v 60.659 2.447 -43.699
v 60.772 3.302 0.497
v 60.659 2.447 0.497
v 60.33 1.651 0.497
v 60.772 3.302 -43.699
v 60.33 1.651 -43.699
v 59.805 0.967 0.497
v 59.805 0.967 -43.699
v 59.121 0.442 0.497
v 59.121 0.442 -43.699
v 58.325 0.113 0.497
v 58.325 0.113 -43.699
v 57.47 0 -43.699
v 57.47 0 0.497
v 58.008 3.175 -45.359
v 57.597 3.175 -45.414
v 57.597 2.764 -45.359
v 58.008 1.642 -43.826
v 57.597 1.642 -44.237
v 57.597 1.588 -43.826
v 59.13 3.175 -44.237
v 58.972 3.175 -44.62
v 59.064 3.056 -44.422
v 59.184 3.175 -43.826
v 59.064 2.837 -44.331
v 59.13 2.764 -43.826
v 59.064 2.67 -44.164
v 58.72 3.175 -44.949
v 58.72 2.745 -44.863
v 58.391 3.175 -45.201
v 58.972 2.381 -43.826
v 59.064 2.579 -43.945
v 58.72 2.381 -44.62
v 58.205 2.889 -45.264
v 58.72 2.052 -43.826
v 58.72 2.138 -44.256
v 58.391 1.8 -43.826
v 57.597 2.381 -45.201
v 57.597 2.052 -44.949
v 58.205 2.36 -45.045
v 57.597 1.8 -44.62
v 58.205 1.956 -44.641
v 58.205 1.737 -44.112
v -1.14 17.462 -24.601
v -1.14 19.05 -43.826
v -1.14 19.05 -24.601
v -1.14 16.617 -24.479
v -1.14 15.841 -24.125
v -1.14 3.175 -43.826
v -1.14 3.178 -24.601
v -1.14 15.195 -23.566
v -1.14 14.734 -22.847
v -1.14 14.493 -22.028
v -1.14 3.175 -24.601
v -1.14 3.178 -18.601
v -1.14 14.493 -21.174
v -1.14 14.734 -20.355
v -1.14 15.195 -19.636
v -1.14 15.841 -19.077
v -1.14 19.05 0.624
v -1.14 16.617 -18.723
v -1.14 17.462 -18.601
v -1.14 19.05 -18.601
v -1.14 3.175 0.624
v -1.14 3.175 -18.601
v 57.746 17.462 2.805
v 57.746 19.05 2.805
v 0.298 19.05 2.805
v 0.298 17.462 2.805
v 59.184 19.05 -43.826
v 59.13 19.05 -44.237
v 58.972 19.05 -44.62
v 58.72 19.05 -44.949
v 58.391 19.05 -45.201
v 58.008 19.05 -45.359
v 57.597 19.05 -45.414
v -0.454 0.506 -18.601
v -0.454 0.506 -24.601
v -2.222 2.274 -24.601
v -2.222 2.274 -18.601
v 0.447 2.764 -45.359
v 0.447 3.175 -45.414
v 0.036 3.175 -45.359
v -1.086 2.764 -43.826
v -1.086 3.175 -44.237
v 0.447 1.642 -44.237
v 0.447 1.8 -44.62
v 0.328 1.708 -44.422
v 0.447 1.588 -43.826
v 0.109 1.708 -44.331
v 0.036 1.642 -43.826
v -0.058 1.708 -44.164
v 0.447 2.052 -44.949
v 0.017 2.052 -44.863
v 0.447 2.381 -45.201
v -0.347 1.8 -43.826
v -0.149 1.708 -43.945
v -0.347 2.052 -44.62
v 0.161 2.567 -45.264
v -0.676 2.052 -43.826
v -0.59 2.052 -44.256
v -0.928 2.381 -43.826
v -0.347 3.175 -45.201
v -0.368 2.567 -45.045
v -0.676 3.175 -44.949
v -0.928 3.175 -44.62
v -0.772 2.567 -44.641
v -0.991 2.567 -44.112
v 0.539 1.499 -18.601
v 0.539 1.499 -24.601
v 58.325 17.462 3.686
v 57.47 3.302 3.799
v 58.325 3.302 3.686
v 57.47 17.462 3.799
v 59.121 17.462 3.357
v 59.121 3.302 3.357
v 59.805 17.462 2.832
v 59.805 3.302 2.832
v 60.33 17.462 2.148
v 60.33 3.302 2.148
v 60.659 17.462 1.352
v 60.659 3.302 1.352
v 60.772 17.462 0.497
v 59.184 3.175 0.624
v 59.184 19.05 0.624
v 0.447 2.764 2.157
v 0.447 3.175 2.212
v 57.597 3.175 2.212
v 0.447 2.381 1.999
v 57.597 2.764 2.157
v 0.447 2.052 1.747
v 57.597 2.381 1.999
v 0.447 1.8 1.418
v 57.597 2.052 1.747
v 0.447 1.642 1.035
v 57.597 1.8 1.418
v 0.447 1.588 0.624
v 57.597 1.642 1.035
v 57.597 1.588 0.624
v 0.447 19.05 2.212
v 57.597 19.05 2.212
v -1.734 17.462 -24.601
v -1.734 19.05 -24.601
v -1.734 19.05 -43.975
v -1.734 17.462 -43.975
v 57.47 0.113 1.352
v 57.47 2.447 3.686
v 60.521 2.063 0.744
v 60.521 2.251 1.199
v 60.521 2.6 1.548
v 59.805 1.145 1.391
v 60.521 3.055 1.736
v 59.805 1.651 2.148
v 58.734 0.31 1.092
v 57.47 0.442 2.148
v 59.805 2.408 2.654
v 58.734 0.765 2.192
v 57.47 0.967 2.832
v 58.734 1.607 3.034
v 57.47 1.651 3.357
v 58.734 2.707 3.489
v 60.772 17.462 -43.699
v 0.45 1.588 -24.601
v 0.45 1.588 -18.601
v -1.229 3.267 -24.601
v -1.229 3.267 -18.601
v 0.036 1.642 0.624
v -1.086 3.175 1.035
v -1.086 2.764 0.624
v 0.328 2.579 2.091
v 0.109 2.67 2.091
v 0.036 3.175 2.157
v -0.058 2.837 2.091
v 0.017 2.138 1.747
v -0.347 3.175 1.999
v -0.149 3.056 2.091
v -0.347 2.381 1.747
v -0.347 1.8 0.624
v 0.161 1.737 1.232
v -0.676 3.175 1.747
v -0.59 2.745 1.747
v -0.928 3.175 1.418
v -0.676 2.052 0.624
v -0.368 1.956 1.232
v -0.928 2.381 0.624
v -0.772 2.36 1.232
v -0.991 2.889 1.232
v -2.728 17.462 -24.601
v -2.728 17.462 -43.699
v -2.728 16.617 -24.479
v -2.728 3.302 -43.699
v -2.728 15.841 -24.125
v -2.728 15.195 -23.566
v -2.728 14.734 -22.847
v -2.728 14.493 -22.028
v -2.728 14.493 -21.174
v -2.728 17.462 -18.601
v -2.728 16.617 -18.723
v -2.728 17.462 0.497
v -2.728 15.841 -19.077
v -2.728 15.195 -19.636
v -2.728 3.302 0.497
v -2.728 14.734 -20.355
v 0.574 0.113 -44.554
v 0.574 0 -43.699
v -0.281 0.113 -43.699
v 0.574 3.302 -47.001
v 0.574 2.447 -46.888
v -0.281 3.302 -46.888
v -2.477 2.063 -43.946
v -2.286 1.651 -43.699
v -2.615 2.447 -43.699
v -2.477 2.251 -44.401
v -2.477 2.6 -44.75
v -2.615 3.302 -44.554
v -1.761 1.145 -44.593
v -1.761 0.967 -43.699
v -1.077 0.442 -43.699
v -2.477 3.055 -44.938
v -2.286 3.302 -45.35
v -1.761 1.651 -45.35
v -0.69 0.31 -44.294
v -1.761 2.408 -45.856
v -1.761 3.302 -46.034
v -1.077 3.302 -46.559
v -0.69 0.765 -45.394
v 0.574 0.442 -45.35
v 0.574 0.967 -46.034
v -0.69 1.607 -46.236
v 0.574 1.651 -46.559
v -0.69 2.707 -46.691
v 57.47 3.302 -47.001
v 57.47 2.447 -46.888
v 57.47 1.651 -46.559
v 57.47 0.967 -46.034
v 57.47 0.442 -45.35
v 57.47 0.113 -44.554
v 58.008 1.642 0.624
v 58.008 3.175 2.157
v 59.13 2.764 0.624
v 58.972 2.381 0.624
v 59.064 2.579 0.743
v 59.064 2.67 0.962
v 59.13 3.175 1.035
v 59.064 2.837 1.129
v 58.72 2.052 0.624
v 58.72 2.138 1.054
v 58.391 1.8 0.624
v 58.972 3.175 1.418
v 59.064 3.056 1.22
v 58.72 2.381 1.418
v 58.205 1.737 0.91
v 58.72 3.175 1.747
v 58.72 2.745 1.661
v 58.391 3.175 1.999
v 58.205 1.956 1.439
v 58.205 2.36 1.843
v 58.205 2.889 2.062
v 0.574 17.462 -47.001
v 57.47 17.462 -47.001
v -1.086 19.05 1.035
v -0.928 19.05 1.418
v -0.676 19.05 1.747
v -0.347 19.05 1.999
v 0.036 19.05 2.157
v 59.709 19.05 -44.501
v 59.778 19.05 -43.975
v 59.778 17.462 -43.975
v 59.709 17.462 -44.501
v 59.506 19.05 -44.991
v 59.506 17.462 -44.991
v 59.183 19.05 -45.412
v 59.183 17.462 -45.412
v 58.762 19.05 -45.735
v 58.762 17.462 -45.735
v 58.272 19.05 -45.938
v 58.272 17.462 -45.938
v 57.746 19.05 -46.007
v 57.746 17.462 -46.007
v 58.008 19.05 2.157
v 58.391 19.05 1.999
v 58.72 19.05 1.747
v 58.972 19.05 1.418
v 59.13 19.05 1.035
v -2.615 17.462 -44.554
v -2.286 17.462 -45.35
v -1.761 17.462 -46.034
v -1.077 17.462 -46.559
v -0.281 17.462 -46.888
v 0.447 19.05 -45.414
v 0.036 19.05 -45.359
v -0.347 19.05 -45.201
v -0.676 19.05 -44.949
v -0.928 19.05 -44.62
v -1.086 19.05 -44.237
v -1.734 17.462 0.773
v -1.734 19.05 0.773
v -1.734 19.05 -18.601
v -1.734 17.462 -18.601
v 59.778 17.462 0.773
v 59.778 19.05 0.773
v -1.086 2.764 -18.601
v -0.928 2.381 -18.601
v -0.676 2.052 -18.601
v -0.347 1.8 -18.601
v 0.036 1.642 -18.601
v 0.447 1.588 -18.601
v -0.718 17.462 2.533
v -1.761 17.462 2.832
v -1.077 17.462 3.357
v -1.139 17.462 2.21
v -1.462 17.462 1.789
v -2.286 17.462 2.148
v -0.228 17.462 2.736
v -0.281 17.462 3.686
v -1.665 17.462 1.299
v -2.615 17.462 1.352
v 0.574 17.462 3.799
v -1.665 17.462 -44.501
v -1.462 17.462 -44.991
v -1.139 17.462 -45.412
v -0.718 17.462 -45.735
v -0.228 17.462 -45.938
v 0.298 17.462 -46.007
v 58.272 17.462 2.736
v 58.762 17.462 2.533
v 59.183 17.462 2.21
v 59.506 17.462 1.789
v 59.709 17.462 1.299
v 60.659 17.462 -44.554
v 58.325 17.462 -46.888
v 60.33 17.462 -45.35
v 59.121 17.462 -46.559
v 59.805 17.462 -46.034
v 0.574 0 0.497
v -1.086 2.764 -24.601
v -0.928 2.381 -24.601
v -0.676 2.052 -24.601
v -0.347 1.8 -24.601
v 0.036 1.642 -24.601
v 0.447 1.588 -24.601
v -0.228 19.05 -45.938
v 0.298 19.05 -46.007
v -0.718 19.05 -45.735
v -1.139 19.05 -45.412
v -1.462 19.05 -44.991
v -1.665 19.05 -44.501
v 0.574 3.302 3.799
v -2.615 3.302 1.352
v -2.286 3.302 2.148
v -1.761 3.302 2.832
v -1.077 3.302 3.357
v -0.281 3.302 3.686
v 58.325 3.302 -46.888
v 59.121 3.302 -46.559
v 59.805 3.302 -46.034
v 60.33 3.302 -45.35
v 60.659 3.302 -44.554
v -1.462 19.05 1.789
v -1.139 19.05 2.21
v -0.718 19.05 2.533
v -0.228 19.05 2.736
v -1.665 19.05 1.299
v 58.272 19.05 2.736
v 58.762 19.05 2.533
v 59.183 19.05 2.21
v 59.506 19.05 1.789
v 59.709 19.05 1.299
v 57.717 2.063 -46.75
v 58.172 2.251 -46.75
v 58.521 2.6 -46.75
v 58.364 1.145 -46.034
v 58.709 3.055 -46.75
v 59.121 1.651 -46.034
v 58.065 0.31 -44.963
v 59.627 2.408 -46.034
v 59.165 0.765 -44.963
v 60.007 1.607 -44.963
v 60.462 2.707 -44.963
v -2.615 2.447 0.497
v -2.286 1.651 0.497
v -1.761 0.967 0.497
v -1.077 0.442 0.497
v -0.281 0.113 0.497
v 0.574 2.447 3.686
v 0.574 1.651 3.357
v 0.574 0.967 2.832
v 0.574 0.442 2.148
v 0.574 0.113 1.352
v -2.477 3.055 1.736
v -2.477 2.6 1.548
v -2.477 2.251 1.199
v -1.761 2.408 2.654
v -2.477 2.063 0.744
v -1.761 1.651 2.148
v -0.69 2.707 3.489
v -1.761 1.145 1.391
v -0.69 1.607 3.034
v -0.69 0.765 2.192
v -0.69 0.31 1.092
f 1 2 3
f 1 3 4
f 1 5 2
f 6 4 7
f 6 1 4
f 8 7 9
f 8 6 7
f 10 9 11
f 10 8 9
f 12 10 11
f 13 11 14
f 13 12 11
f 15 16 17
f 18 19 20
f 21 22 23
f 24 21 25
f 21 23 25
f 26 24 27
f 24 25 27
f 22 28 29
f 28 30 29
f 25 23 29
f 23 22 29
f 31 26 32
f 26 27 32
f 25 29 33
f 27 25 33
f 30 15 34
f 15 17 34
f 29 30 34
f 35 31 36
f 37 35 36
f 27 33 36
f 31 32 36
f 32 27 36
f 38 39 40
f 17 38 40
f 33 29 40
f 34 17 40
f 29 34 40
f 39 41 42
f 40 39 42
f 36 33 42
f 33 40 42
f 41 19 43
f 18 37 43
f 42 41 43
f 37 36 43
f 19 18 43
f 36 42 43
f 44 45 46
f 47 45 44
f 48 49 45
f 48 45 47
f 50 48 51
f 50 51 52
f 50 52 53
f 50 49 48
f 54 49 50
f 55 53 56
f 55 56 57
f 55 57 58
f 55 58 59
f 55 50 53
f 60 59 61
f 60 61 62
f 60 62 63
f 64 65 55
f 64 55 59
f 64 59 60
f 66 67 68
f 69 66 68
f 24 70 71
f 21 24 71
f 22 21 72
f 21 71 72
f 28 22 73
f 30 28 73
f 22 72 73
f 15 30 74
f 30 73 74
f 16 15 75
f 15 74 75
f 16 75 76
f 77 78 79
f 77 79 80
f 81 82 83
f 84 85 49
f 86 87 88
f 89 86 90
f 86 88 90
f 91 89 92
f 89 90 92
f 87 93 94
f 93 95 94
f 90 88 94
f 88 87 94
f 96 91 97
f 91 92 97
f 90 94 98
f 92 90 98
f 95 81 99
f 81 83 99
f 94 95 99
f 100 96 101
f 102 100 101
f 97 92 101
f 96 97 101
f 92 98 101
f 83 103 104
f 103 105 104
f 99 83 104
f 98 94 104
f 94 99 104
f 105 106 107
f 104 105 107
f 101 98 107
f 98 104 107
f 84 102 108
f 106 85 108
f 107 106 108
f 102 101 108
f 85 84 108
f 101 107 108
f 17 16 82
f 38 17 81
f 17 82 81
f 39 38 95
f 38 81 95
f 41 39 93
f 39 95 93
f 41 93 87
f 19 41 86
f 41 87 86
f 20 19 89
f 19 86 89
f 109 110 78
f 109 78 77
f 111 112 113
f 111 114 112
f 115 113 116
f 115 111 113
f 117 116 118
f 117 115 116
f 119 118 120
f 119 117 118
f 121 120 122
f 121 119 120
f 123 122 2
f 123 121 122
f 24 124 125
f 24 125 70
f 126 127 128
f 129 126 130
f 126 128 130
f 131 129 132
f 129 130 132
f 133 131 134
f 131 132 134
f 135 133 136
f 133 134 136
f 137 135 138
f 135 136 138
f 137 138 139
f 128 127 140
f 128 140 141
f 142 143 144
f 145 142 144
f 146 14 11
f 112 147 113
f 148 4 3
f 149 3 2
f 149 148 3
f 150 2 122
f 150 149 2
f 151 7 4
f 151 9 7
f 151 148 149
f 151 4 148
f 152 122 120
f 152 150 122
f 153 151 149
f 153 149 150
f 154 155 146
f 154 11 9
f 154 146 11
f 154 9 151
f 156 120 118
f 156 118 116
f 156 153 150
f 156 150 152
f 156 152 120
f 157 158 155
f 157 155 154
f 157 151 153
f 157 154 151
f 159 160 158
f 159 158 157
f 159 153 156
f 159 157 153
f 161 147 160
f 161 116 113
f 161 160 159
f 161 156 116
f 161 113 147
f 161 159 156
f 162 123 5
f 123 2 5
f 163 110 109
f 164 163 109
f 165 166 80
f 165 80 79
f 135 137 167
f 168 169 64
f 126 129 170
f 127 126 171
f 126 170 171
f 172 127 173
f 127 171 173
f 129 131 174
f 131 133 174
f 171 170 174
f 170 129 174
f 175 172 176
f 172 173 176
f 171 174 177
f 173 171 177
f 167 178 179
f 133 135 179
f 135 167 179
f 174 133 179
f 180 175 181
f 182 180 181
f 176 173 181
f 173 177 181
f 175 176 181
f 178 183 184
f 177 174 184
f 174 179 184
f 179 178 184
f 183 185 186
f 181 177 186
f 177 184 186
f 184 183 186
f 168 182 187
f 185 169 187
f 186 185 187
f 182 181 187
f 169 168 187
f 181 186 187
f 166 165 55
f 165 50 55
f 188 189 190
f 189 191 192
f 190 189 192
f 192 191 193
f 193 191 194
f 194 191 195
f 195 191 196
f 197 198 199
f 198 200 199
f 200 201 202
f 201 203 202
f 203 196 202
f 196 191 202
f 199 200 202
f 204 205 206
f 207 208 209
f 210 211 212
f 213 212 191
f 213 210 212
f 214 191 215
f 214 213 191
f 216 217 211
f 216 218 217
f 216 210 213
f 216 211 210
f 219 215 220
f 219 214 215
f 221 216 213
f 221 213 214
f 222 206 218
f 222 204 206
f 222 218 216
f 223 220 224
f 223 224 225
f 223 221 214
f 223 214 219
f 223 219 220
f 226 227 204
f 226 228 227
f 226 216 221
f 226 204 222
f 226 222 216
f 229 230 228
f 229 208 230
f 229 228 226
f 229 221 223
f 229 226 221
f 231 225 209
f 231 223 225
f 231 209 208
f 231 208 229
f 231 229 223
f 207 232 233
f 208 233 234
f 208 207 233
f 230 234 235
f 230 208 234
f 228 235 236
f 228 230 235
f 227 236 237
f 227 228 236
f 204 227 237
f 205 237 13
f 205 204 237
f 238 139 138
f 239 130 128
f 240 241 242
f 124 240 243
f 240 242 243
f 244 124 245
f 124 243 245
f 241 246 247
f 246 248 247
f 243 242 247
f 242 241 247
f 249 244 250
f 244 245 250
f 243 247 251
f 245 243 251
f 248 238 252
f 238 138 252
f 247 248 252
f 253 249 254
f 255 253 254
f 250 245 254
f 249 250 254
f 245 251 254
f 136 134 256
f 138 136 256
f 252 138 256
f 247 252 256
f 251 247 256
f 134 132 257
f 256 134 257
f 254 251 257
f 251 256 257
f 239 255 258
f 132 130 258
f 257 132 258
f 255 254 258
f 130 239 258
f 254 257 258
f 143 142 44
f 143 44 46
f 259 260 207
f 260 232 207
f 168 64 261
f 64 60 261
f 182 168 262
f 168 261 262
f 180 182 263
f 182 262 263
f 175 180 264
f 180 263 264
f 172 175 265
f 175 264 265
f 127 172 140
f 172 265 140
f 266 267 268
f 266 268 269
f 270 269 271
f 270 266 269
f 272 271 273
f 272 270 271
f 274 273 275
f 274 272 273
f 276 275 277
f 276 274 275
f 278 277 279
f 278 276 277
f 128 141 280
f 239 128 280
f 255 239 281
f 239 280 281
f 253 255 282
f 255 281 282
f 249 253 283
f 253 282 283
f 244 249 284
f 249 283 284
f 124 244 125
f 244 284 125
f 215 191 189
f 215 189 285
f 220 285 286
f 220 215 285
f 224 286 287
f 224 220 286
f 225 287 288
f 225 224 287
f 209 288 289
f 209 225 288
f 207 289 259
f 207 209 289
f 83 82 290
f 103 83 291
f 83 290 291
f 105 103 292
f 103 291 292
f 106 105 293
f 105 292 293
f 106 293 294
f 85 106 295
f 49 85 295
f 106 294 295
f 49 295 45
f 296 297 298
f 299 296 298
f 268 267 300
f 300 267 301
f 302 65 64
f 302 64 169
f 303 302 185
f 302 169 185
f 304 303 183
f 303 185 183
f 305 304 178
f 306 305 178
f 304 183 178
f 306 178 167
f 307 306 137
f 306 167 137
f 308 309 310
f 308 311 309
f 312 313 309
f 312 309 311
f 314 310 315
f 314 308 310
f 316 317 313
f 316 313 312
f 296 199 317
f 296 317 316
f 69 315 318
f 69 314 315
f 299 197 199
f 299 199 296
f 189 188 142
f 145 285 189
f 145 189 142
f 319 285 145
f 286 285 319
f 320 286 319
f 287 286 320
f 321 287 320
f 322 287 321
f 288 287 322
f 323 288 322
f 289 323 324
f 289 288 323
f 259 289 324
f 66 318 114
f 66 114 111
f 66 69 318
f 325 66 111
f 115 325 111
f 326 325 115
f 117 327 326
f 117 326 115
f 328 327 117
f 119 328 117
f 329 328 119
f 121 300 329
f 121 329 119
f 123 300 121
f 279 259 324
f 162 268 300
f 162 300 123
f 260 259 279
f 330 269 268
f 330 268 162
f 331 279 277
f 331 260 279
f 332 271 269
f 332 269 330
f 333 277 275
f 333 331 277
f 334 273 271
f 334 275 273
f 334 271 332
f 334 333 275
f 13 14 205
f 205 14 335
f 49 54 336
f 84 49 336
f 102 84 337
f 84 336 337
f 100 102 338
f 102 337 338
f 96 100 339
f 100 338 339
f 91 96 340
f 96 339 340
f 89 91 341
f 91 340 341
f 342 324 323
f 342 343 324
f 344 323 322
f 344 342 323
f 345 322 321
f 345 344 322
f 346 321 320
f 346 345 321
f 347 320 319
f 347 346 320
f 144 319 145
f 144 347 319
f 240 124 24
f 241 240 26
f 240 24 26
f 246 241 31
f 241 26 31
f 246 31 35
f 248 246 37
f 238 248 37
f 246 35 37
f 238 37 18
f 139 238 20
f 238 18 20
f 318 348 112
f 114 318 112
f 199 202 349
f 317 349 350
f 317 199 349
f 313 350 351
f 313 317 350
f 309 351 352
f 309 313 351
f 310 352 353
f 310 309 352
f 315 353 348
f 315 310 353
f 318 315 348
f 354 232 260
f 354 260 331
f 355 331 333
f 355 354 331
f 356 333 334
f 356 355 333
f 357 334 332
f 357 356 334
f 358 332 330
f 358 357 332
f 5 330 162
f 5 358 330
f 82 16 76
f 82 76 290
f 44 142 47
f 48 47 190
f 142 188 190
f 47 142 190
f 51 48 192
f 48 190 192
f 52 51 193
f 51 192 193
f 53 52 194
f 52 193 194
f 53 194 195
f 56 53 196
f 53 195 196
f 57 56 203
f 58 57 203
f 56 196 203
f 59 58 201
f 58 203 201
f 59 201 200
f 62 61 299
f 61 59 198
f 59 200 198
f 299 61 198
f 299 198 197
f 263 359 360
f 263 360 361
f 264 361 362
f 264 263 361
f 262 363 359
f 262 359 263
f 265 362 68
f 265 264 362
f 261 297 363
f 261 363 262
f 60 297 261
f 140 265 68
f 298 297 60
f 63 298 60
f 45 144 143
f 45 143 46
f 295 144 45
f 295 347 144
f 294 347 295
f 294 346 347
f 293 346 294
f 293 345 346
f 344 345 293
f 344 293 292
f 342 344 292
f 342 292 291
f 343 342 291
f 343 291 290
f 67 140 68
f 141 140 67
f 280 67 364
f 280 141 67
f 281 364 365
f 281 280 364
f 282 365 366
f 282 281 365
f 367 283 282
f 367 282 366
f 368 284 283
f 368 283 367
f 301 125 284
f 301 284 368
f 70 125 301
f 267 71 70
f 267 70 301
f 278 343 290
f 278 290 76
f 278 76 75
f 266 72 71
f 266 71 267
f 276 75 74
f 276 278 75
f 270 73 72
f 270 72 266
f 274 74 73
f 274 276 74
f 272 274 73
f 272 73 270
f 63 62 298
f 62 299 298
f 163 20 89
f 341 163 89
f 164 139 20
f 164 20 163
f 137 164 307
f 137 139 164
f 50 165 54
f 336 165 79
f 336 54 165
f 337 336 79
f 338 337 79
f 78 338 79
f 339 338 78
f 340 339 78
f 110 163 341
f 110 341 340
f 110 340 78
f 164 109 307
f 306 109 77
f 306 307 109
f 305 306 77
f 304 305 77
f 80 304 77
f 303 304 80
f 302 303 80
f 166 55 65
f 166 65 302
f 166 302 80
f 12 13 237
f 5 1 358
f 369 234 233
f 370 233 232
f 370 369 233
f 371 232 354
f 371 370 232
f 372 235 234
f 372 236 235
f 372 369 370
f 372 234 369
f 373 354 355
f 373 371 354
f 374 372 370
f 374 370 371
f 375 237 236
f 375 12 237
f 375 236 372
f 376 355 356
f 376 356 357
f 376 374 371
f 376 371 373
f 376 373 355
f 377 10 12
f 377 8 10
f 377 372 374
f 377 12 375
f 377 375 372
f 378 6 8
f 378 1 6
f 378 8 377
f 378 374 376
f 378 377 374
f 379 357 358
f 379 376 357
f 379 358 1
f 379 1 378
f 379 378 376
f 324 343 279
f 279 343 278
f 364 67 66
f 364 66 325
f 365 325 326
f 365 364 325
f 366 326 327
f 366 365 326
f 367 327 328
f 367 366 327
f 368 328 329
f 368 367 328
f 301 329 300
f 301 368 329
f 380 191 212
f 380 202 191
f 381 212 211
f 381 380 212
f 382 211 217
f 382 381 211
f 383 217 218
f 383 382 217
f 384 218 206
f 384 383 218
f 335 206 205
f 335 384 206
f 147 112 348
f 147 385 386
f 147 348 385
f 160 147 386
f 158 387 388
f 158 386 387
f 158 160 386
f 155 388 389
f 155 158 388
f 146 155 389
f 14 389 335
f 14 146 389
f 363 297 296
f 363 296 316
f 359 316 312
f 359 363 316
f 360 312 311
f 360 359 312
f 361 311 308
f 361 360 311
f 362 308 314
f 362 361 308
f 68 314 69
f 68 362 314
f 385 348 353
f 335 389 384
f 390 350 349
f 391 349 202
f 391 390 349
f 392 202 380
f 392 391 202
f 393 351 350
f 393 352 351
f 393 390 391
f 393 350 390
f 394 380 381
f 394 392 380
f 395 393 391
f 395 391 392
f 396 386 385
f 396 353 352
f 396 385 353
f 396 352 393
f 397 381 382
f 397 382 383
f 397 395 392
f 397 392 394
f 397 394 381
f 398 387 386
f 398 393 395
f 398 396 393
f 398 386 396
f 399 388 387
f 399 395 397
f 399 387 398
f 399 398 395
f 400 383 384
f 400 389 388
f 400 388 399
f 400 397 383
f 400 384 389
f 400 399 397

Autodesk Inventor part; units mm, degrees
ref_plane "YZ Plane" through (0, 0, 0) normal (1, 0, 0) x (0, 1, 0)
ref_plane "XZ Plane" through (0, 0, 0) normal (0, 1, 0) x (-1, 0, 0)
ref_plane "XY Plane" through (0, 0, 0) normal (0, 0, 1) x (1, 0, 0)
sketch "Sketch1" plane through (0, 0, 0) normal (0, 1, 0) x (-1, 0, 0)
  line L0 (2.728, 3.799) -> (-60.772, 3.799)
  line L1 (-60.772, 3.799) -> (-60.772, -47.001)
  line L2 (-60.772, -47.001) -> (2.728, -47.001)
  line L3 (2.728, -47.001) -> (2.728, 3.799)
  dimension "d0" = 63.5
  dimension "d1" = 50.8
extrude "Extrusion1" add sketch "Sketch1" along normal blind 1.5875
sketch "Sketch2" plane through (0, 1.5875, 0) normal (0, 1, 0) x (1, 0, 0)
  line L0 (59.1845, 45.4135) -> (-1.1405, 45.4135)
  line L1 (-1.1405, 45.4135) -> (-1.1405, -2.2115)
  line L2 (-1.1405, -2.2115) -> (59.1845, -2.2115)
  line L3 (59.1845, -2.2115) -> (59.1845, 45.4135)
  line L4 (60.772, 47.001) -> (-2.728, 47.001) projected
  line L5 (-2.728, 47.001) -> (-2.728, -3.799) projected
  line L6 (60.772, -3.799) -> (60.772, 47.001) projected
  line L7 (-2.728, -3.799) -> (60.772, -3.799) projected
  point P0 (0, 0)
  dimension "d4" = 1.5875
  dimension "d5" = 1.5875
  dimension "d6" = 1.5875
  dimension "d7" = 1.5875
extrude "Extrusion2" add sketch "Sketch2" along normal blind 17.4625
fillet "Fillet1" radius 3.302 8 edges at (29.022, 0, 3.799) (60.772, 0, -21.601) (29.022, 0, -47.001) (-2.728, 0, -21.601) (60.772, 9.525, -47.001) (60.772, 9.525, 3.799) (-2.728, 9.525, 3.799) (-2.728, 9.525, -47.001)
fillet "Fillet2" radius 1.5875 8 edges at (-1.1405, 10.3188, -45.4135) (29.022, 1.5875, -45.4135) (-1.1405, 1.5875, -21.601) (-1.1405, 10.3188, 2.2115) (29.022, 1.5875, 2.2115) (59.1845, 10.3188, 2.2115) (59.1845, 1.5875, -21.601) (59.1845, 10.3188, -45.4135)
sketch "Sketch4" plane through (0, 19.05, 0) normal (0, 1, 0) x (1, 0, 0)
  line L0 (0.447, 45.4135) -> (57.597, 45.4135) projected
  arc A0 (0.447, 45.4135) -> (-1.1405, 43.826) centre (0.447, 43.826) ccw projected
  line L1 (-1.1405, -0.624) -> (-1.1405, 43.826) projected
  arc A1 (59.1845, 43.826) -> (57.597, 45.4135) centre (57.597, 43.826) ccw projected
  line L2 (59.1845, 43.826) -> (59.1845, -0.624) projected
  arc A2 (57.597, -2.2115) -> (59.1845, -0.624) centre (57.597, -0.624) ccw projected
  line L3 (57.597, -2.2115) -> (0.447, -2.2115) projected
  arc A3 (-1.1405, -0.624) -> (0.447, -2.2115) centre (0.447, -0.624) ccw projected
  line L4 (0.2977, 46.0073) -> (57.7462, 46.0073)
  line L5 (59.7782, 43.9753) -> (59.7782, -0.7732)
  line L6 (57.7462, -2.8052) -> (0.2977, -2.8052)
  line L7 (-1.7343, -0.7732) -> (-1.7343, 43.9753)
  line L8 (57.47, 47.001) -> (0.574, 47.001) projected
  line L9 (-2.728, 43.699) -> (-2.728, -0.497) projected
  arc A4 (0.574, 47.001) -> (-2.728, 43.699) centre (0.574, 43.699) ccw projected
  arc A5 (60.772, 43.699) -> (57.47, 47.001) centre (57.47, 43.699) ccw projected
  line L10 (60.772, -0.497) -> (60.772, 43.699) projected
  arc A6 (57.47, -3.799) -> (60.772, -0.497) centre (57.47, -0.497) ccw projected
  line L11 (0.574, -3.799) -> (57.47, -3.799) projected
  arc A7 (-2.728, -0.497) -> (0.574, -3.799) centre (0.574, -0.497) ccw projected
  line L12 (9.3601, 46.0073) -> (9.3601, 47.001)
  line L13 (9.9735, 46.0073) -> (9.9735, 45.2135)
  line L14 (-1.7343, 35.9118) -> (-2.728, 35.9118)
  line L15 (-1.7343, 35.9118) -> (-1.1405, 35.9118)
  line L16 (3.5402, -2.2115) -> (3.5402, -2.8052)
  line L17 (3.9514, -2.8052) -> (3.9514, -3.799)
  line L18 (59.1845, 4.7048) -> (59.7782, 4.7048)
  line L19 (59.7782, 4.7048) -> (60.772, 4.7048)
  arc A8 (0.2977, 46.0073) -> (-1.7343, 43.9753) centre (0.2977, 43.9753) ccw
  arc A9 (59.7782, 43.9753) -> (57.7462, 46.0073) centre (57.7462, 43.9753) ccw
  arc A10 (-1.7343, -0.7732) -> (0.2977, -2.8052) centre (0.2977, -0.7732) ccw
  arc A11 (57.7462, -2.8052) -> (59.7782, -0.7732) centre (57.7462, -0.7732) ccw
  point P0 (0, 0)
  dimension "d20" = 2.032
  dimension "d21" = 2.032
  dimension "d22" = 2.032
  dimension "d23" = 2.032
  dimension "d26" = 0.9938
  dimension "d27" = 0.9938
  dimension "d28" = 0.9938
  dimension "d29" = 0.9938
extrude "Extrusion4" cut sketch "Sketch4" against normal blind 1.5875 contours L4 L12 L8 A5 L10 L19 L5 A9 | L4 A8 L7 L14 L9 A4 L8 L12 | L7 A10 L6 L17 L11 A7 L9 L14 | L19 L10 A6 L11 L17 L6 A11 L5
ref_plane "Work Plane1" through (-1.1405, 3.175, -33.5073) normal (0.7071, 0.7071, 0) x (0, 0, 1)
sketch "Sketch8" plane through (-1.1405, 3.175, -33.5073) normal (0.7071, 0.7071, 0) x (0, 0, 1)
  line L0 (34.1313, 0) -> (34.1313, 2.2451) projected
  line L1 (-10.3187, 0) -> (34.1313, 0) projected
  line L2 (34.1313, 2.2451) -> (-10.3187, 2.2451) projected
  line L3 (-10.3187, 2.2451) -> (-10.3187, 0) projected
  line L4 (14.9063, -0.1275) -> (8.9063, -0.1275)
  line L5 (8.9063, -0.1275) -> (8.9063, 2.3725)
  line L6 (8.9063, 2.3725) -> (14.9063, 2.3725)
  line L7 (14.9063, 2.3725) -> (14.9063, -0.1275)
  line L8 (14.9063, 1.1225) -> (34.1313, 1.1225)
  line L9 (8.9063, 1.8195) -> (-10.3187, 1.8195)
  line L10 (14.1632, 0) -> (14.1632, -0.1275)
  line L11 (13.7933, 2.3725) -> (13.7933, 2.2451)
  point P0 (33.5073, 3.0515)
  dimension "d43" = 6
  dimension "d44" = 2.5
extrude "Extrusion7" cut sketch "Sketch8" against normal blind 1.4 contours L7 L4 L10 L1 | L1 L5 L2 L7 | L10 L4 L5 L1 | L2 L11 L6 L7 | L2 L5 L6 L11
ref_plane "Work Plane2" through (-2.728, 3.302, -34.301) normal (1, 0, 0) x (0, 0, -1)
sketch "Sketch9" plane through (-2.728, 3.302, -34.301) normal (1, 0, 0) x (0, 0, -1)
  line L0 (-34.798, 14.1605) -> (9.398, 14.1605) projected
  line L1 (12.7, 14.1605) -> (12.7, 0) projected
  line L2 (-38.1, 0) -> (-38.1, 14.1605) projected
  circle A0 centre (-12.7, 14.1605) radius 3
  line L3 (-12.7, 14.1605) -> (12.7, 14.1605)
  line L4 (12.7, 0) -> (12.7, 14.1605) projected
  line L5 (-12.7, 14.1605) -> (-38.1, 14.1605)
  line L6 (-38.1, 14.1605) -> (-38.1, 0) projected
  line L7 (9.398, 14.1605) -> (-34.798, 14.1605) projected
  line L8 (-9.7, 14.1605) -> (-9.7, 15.748)
  line L9 (-34.925, 15.748) -> (9.525, 15.748) projected
  line L10 (-15.7, 14.1605) -> (-15.7, 15.748)
  point P0 (-34.301, -3.302)
  dimension "d47" = 6
extrude "Extrusion9" cut sketch "Sketch9" along normal blind 3
equation "\"d5\" = d4"
equation "\"d6\" = d4"
equation "\"d7\" = d4"
properties part number "RFID_Box"
